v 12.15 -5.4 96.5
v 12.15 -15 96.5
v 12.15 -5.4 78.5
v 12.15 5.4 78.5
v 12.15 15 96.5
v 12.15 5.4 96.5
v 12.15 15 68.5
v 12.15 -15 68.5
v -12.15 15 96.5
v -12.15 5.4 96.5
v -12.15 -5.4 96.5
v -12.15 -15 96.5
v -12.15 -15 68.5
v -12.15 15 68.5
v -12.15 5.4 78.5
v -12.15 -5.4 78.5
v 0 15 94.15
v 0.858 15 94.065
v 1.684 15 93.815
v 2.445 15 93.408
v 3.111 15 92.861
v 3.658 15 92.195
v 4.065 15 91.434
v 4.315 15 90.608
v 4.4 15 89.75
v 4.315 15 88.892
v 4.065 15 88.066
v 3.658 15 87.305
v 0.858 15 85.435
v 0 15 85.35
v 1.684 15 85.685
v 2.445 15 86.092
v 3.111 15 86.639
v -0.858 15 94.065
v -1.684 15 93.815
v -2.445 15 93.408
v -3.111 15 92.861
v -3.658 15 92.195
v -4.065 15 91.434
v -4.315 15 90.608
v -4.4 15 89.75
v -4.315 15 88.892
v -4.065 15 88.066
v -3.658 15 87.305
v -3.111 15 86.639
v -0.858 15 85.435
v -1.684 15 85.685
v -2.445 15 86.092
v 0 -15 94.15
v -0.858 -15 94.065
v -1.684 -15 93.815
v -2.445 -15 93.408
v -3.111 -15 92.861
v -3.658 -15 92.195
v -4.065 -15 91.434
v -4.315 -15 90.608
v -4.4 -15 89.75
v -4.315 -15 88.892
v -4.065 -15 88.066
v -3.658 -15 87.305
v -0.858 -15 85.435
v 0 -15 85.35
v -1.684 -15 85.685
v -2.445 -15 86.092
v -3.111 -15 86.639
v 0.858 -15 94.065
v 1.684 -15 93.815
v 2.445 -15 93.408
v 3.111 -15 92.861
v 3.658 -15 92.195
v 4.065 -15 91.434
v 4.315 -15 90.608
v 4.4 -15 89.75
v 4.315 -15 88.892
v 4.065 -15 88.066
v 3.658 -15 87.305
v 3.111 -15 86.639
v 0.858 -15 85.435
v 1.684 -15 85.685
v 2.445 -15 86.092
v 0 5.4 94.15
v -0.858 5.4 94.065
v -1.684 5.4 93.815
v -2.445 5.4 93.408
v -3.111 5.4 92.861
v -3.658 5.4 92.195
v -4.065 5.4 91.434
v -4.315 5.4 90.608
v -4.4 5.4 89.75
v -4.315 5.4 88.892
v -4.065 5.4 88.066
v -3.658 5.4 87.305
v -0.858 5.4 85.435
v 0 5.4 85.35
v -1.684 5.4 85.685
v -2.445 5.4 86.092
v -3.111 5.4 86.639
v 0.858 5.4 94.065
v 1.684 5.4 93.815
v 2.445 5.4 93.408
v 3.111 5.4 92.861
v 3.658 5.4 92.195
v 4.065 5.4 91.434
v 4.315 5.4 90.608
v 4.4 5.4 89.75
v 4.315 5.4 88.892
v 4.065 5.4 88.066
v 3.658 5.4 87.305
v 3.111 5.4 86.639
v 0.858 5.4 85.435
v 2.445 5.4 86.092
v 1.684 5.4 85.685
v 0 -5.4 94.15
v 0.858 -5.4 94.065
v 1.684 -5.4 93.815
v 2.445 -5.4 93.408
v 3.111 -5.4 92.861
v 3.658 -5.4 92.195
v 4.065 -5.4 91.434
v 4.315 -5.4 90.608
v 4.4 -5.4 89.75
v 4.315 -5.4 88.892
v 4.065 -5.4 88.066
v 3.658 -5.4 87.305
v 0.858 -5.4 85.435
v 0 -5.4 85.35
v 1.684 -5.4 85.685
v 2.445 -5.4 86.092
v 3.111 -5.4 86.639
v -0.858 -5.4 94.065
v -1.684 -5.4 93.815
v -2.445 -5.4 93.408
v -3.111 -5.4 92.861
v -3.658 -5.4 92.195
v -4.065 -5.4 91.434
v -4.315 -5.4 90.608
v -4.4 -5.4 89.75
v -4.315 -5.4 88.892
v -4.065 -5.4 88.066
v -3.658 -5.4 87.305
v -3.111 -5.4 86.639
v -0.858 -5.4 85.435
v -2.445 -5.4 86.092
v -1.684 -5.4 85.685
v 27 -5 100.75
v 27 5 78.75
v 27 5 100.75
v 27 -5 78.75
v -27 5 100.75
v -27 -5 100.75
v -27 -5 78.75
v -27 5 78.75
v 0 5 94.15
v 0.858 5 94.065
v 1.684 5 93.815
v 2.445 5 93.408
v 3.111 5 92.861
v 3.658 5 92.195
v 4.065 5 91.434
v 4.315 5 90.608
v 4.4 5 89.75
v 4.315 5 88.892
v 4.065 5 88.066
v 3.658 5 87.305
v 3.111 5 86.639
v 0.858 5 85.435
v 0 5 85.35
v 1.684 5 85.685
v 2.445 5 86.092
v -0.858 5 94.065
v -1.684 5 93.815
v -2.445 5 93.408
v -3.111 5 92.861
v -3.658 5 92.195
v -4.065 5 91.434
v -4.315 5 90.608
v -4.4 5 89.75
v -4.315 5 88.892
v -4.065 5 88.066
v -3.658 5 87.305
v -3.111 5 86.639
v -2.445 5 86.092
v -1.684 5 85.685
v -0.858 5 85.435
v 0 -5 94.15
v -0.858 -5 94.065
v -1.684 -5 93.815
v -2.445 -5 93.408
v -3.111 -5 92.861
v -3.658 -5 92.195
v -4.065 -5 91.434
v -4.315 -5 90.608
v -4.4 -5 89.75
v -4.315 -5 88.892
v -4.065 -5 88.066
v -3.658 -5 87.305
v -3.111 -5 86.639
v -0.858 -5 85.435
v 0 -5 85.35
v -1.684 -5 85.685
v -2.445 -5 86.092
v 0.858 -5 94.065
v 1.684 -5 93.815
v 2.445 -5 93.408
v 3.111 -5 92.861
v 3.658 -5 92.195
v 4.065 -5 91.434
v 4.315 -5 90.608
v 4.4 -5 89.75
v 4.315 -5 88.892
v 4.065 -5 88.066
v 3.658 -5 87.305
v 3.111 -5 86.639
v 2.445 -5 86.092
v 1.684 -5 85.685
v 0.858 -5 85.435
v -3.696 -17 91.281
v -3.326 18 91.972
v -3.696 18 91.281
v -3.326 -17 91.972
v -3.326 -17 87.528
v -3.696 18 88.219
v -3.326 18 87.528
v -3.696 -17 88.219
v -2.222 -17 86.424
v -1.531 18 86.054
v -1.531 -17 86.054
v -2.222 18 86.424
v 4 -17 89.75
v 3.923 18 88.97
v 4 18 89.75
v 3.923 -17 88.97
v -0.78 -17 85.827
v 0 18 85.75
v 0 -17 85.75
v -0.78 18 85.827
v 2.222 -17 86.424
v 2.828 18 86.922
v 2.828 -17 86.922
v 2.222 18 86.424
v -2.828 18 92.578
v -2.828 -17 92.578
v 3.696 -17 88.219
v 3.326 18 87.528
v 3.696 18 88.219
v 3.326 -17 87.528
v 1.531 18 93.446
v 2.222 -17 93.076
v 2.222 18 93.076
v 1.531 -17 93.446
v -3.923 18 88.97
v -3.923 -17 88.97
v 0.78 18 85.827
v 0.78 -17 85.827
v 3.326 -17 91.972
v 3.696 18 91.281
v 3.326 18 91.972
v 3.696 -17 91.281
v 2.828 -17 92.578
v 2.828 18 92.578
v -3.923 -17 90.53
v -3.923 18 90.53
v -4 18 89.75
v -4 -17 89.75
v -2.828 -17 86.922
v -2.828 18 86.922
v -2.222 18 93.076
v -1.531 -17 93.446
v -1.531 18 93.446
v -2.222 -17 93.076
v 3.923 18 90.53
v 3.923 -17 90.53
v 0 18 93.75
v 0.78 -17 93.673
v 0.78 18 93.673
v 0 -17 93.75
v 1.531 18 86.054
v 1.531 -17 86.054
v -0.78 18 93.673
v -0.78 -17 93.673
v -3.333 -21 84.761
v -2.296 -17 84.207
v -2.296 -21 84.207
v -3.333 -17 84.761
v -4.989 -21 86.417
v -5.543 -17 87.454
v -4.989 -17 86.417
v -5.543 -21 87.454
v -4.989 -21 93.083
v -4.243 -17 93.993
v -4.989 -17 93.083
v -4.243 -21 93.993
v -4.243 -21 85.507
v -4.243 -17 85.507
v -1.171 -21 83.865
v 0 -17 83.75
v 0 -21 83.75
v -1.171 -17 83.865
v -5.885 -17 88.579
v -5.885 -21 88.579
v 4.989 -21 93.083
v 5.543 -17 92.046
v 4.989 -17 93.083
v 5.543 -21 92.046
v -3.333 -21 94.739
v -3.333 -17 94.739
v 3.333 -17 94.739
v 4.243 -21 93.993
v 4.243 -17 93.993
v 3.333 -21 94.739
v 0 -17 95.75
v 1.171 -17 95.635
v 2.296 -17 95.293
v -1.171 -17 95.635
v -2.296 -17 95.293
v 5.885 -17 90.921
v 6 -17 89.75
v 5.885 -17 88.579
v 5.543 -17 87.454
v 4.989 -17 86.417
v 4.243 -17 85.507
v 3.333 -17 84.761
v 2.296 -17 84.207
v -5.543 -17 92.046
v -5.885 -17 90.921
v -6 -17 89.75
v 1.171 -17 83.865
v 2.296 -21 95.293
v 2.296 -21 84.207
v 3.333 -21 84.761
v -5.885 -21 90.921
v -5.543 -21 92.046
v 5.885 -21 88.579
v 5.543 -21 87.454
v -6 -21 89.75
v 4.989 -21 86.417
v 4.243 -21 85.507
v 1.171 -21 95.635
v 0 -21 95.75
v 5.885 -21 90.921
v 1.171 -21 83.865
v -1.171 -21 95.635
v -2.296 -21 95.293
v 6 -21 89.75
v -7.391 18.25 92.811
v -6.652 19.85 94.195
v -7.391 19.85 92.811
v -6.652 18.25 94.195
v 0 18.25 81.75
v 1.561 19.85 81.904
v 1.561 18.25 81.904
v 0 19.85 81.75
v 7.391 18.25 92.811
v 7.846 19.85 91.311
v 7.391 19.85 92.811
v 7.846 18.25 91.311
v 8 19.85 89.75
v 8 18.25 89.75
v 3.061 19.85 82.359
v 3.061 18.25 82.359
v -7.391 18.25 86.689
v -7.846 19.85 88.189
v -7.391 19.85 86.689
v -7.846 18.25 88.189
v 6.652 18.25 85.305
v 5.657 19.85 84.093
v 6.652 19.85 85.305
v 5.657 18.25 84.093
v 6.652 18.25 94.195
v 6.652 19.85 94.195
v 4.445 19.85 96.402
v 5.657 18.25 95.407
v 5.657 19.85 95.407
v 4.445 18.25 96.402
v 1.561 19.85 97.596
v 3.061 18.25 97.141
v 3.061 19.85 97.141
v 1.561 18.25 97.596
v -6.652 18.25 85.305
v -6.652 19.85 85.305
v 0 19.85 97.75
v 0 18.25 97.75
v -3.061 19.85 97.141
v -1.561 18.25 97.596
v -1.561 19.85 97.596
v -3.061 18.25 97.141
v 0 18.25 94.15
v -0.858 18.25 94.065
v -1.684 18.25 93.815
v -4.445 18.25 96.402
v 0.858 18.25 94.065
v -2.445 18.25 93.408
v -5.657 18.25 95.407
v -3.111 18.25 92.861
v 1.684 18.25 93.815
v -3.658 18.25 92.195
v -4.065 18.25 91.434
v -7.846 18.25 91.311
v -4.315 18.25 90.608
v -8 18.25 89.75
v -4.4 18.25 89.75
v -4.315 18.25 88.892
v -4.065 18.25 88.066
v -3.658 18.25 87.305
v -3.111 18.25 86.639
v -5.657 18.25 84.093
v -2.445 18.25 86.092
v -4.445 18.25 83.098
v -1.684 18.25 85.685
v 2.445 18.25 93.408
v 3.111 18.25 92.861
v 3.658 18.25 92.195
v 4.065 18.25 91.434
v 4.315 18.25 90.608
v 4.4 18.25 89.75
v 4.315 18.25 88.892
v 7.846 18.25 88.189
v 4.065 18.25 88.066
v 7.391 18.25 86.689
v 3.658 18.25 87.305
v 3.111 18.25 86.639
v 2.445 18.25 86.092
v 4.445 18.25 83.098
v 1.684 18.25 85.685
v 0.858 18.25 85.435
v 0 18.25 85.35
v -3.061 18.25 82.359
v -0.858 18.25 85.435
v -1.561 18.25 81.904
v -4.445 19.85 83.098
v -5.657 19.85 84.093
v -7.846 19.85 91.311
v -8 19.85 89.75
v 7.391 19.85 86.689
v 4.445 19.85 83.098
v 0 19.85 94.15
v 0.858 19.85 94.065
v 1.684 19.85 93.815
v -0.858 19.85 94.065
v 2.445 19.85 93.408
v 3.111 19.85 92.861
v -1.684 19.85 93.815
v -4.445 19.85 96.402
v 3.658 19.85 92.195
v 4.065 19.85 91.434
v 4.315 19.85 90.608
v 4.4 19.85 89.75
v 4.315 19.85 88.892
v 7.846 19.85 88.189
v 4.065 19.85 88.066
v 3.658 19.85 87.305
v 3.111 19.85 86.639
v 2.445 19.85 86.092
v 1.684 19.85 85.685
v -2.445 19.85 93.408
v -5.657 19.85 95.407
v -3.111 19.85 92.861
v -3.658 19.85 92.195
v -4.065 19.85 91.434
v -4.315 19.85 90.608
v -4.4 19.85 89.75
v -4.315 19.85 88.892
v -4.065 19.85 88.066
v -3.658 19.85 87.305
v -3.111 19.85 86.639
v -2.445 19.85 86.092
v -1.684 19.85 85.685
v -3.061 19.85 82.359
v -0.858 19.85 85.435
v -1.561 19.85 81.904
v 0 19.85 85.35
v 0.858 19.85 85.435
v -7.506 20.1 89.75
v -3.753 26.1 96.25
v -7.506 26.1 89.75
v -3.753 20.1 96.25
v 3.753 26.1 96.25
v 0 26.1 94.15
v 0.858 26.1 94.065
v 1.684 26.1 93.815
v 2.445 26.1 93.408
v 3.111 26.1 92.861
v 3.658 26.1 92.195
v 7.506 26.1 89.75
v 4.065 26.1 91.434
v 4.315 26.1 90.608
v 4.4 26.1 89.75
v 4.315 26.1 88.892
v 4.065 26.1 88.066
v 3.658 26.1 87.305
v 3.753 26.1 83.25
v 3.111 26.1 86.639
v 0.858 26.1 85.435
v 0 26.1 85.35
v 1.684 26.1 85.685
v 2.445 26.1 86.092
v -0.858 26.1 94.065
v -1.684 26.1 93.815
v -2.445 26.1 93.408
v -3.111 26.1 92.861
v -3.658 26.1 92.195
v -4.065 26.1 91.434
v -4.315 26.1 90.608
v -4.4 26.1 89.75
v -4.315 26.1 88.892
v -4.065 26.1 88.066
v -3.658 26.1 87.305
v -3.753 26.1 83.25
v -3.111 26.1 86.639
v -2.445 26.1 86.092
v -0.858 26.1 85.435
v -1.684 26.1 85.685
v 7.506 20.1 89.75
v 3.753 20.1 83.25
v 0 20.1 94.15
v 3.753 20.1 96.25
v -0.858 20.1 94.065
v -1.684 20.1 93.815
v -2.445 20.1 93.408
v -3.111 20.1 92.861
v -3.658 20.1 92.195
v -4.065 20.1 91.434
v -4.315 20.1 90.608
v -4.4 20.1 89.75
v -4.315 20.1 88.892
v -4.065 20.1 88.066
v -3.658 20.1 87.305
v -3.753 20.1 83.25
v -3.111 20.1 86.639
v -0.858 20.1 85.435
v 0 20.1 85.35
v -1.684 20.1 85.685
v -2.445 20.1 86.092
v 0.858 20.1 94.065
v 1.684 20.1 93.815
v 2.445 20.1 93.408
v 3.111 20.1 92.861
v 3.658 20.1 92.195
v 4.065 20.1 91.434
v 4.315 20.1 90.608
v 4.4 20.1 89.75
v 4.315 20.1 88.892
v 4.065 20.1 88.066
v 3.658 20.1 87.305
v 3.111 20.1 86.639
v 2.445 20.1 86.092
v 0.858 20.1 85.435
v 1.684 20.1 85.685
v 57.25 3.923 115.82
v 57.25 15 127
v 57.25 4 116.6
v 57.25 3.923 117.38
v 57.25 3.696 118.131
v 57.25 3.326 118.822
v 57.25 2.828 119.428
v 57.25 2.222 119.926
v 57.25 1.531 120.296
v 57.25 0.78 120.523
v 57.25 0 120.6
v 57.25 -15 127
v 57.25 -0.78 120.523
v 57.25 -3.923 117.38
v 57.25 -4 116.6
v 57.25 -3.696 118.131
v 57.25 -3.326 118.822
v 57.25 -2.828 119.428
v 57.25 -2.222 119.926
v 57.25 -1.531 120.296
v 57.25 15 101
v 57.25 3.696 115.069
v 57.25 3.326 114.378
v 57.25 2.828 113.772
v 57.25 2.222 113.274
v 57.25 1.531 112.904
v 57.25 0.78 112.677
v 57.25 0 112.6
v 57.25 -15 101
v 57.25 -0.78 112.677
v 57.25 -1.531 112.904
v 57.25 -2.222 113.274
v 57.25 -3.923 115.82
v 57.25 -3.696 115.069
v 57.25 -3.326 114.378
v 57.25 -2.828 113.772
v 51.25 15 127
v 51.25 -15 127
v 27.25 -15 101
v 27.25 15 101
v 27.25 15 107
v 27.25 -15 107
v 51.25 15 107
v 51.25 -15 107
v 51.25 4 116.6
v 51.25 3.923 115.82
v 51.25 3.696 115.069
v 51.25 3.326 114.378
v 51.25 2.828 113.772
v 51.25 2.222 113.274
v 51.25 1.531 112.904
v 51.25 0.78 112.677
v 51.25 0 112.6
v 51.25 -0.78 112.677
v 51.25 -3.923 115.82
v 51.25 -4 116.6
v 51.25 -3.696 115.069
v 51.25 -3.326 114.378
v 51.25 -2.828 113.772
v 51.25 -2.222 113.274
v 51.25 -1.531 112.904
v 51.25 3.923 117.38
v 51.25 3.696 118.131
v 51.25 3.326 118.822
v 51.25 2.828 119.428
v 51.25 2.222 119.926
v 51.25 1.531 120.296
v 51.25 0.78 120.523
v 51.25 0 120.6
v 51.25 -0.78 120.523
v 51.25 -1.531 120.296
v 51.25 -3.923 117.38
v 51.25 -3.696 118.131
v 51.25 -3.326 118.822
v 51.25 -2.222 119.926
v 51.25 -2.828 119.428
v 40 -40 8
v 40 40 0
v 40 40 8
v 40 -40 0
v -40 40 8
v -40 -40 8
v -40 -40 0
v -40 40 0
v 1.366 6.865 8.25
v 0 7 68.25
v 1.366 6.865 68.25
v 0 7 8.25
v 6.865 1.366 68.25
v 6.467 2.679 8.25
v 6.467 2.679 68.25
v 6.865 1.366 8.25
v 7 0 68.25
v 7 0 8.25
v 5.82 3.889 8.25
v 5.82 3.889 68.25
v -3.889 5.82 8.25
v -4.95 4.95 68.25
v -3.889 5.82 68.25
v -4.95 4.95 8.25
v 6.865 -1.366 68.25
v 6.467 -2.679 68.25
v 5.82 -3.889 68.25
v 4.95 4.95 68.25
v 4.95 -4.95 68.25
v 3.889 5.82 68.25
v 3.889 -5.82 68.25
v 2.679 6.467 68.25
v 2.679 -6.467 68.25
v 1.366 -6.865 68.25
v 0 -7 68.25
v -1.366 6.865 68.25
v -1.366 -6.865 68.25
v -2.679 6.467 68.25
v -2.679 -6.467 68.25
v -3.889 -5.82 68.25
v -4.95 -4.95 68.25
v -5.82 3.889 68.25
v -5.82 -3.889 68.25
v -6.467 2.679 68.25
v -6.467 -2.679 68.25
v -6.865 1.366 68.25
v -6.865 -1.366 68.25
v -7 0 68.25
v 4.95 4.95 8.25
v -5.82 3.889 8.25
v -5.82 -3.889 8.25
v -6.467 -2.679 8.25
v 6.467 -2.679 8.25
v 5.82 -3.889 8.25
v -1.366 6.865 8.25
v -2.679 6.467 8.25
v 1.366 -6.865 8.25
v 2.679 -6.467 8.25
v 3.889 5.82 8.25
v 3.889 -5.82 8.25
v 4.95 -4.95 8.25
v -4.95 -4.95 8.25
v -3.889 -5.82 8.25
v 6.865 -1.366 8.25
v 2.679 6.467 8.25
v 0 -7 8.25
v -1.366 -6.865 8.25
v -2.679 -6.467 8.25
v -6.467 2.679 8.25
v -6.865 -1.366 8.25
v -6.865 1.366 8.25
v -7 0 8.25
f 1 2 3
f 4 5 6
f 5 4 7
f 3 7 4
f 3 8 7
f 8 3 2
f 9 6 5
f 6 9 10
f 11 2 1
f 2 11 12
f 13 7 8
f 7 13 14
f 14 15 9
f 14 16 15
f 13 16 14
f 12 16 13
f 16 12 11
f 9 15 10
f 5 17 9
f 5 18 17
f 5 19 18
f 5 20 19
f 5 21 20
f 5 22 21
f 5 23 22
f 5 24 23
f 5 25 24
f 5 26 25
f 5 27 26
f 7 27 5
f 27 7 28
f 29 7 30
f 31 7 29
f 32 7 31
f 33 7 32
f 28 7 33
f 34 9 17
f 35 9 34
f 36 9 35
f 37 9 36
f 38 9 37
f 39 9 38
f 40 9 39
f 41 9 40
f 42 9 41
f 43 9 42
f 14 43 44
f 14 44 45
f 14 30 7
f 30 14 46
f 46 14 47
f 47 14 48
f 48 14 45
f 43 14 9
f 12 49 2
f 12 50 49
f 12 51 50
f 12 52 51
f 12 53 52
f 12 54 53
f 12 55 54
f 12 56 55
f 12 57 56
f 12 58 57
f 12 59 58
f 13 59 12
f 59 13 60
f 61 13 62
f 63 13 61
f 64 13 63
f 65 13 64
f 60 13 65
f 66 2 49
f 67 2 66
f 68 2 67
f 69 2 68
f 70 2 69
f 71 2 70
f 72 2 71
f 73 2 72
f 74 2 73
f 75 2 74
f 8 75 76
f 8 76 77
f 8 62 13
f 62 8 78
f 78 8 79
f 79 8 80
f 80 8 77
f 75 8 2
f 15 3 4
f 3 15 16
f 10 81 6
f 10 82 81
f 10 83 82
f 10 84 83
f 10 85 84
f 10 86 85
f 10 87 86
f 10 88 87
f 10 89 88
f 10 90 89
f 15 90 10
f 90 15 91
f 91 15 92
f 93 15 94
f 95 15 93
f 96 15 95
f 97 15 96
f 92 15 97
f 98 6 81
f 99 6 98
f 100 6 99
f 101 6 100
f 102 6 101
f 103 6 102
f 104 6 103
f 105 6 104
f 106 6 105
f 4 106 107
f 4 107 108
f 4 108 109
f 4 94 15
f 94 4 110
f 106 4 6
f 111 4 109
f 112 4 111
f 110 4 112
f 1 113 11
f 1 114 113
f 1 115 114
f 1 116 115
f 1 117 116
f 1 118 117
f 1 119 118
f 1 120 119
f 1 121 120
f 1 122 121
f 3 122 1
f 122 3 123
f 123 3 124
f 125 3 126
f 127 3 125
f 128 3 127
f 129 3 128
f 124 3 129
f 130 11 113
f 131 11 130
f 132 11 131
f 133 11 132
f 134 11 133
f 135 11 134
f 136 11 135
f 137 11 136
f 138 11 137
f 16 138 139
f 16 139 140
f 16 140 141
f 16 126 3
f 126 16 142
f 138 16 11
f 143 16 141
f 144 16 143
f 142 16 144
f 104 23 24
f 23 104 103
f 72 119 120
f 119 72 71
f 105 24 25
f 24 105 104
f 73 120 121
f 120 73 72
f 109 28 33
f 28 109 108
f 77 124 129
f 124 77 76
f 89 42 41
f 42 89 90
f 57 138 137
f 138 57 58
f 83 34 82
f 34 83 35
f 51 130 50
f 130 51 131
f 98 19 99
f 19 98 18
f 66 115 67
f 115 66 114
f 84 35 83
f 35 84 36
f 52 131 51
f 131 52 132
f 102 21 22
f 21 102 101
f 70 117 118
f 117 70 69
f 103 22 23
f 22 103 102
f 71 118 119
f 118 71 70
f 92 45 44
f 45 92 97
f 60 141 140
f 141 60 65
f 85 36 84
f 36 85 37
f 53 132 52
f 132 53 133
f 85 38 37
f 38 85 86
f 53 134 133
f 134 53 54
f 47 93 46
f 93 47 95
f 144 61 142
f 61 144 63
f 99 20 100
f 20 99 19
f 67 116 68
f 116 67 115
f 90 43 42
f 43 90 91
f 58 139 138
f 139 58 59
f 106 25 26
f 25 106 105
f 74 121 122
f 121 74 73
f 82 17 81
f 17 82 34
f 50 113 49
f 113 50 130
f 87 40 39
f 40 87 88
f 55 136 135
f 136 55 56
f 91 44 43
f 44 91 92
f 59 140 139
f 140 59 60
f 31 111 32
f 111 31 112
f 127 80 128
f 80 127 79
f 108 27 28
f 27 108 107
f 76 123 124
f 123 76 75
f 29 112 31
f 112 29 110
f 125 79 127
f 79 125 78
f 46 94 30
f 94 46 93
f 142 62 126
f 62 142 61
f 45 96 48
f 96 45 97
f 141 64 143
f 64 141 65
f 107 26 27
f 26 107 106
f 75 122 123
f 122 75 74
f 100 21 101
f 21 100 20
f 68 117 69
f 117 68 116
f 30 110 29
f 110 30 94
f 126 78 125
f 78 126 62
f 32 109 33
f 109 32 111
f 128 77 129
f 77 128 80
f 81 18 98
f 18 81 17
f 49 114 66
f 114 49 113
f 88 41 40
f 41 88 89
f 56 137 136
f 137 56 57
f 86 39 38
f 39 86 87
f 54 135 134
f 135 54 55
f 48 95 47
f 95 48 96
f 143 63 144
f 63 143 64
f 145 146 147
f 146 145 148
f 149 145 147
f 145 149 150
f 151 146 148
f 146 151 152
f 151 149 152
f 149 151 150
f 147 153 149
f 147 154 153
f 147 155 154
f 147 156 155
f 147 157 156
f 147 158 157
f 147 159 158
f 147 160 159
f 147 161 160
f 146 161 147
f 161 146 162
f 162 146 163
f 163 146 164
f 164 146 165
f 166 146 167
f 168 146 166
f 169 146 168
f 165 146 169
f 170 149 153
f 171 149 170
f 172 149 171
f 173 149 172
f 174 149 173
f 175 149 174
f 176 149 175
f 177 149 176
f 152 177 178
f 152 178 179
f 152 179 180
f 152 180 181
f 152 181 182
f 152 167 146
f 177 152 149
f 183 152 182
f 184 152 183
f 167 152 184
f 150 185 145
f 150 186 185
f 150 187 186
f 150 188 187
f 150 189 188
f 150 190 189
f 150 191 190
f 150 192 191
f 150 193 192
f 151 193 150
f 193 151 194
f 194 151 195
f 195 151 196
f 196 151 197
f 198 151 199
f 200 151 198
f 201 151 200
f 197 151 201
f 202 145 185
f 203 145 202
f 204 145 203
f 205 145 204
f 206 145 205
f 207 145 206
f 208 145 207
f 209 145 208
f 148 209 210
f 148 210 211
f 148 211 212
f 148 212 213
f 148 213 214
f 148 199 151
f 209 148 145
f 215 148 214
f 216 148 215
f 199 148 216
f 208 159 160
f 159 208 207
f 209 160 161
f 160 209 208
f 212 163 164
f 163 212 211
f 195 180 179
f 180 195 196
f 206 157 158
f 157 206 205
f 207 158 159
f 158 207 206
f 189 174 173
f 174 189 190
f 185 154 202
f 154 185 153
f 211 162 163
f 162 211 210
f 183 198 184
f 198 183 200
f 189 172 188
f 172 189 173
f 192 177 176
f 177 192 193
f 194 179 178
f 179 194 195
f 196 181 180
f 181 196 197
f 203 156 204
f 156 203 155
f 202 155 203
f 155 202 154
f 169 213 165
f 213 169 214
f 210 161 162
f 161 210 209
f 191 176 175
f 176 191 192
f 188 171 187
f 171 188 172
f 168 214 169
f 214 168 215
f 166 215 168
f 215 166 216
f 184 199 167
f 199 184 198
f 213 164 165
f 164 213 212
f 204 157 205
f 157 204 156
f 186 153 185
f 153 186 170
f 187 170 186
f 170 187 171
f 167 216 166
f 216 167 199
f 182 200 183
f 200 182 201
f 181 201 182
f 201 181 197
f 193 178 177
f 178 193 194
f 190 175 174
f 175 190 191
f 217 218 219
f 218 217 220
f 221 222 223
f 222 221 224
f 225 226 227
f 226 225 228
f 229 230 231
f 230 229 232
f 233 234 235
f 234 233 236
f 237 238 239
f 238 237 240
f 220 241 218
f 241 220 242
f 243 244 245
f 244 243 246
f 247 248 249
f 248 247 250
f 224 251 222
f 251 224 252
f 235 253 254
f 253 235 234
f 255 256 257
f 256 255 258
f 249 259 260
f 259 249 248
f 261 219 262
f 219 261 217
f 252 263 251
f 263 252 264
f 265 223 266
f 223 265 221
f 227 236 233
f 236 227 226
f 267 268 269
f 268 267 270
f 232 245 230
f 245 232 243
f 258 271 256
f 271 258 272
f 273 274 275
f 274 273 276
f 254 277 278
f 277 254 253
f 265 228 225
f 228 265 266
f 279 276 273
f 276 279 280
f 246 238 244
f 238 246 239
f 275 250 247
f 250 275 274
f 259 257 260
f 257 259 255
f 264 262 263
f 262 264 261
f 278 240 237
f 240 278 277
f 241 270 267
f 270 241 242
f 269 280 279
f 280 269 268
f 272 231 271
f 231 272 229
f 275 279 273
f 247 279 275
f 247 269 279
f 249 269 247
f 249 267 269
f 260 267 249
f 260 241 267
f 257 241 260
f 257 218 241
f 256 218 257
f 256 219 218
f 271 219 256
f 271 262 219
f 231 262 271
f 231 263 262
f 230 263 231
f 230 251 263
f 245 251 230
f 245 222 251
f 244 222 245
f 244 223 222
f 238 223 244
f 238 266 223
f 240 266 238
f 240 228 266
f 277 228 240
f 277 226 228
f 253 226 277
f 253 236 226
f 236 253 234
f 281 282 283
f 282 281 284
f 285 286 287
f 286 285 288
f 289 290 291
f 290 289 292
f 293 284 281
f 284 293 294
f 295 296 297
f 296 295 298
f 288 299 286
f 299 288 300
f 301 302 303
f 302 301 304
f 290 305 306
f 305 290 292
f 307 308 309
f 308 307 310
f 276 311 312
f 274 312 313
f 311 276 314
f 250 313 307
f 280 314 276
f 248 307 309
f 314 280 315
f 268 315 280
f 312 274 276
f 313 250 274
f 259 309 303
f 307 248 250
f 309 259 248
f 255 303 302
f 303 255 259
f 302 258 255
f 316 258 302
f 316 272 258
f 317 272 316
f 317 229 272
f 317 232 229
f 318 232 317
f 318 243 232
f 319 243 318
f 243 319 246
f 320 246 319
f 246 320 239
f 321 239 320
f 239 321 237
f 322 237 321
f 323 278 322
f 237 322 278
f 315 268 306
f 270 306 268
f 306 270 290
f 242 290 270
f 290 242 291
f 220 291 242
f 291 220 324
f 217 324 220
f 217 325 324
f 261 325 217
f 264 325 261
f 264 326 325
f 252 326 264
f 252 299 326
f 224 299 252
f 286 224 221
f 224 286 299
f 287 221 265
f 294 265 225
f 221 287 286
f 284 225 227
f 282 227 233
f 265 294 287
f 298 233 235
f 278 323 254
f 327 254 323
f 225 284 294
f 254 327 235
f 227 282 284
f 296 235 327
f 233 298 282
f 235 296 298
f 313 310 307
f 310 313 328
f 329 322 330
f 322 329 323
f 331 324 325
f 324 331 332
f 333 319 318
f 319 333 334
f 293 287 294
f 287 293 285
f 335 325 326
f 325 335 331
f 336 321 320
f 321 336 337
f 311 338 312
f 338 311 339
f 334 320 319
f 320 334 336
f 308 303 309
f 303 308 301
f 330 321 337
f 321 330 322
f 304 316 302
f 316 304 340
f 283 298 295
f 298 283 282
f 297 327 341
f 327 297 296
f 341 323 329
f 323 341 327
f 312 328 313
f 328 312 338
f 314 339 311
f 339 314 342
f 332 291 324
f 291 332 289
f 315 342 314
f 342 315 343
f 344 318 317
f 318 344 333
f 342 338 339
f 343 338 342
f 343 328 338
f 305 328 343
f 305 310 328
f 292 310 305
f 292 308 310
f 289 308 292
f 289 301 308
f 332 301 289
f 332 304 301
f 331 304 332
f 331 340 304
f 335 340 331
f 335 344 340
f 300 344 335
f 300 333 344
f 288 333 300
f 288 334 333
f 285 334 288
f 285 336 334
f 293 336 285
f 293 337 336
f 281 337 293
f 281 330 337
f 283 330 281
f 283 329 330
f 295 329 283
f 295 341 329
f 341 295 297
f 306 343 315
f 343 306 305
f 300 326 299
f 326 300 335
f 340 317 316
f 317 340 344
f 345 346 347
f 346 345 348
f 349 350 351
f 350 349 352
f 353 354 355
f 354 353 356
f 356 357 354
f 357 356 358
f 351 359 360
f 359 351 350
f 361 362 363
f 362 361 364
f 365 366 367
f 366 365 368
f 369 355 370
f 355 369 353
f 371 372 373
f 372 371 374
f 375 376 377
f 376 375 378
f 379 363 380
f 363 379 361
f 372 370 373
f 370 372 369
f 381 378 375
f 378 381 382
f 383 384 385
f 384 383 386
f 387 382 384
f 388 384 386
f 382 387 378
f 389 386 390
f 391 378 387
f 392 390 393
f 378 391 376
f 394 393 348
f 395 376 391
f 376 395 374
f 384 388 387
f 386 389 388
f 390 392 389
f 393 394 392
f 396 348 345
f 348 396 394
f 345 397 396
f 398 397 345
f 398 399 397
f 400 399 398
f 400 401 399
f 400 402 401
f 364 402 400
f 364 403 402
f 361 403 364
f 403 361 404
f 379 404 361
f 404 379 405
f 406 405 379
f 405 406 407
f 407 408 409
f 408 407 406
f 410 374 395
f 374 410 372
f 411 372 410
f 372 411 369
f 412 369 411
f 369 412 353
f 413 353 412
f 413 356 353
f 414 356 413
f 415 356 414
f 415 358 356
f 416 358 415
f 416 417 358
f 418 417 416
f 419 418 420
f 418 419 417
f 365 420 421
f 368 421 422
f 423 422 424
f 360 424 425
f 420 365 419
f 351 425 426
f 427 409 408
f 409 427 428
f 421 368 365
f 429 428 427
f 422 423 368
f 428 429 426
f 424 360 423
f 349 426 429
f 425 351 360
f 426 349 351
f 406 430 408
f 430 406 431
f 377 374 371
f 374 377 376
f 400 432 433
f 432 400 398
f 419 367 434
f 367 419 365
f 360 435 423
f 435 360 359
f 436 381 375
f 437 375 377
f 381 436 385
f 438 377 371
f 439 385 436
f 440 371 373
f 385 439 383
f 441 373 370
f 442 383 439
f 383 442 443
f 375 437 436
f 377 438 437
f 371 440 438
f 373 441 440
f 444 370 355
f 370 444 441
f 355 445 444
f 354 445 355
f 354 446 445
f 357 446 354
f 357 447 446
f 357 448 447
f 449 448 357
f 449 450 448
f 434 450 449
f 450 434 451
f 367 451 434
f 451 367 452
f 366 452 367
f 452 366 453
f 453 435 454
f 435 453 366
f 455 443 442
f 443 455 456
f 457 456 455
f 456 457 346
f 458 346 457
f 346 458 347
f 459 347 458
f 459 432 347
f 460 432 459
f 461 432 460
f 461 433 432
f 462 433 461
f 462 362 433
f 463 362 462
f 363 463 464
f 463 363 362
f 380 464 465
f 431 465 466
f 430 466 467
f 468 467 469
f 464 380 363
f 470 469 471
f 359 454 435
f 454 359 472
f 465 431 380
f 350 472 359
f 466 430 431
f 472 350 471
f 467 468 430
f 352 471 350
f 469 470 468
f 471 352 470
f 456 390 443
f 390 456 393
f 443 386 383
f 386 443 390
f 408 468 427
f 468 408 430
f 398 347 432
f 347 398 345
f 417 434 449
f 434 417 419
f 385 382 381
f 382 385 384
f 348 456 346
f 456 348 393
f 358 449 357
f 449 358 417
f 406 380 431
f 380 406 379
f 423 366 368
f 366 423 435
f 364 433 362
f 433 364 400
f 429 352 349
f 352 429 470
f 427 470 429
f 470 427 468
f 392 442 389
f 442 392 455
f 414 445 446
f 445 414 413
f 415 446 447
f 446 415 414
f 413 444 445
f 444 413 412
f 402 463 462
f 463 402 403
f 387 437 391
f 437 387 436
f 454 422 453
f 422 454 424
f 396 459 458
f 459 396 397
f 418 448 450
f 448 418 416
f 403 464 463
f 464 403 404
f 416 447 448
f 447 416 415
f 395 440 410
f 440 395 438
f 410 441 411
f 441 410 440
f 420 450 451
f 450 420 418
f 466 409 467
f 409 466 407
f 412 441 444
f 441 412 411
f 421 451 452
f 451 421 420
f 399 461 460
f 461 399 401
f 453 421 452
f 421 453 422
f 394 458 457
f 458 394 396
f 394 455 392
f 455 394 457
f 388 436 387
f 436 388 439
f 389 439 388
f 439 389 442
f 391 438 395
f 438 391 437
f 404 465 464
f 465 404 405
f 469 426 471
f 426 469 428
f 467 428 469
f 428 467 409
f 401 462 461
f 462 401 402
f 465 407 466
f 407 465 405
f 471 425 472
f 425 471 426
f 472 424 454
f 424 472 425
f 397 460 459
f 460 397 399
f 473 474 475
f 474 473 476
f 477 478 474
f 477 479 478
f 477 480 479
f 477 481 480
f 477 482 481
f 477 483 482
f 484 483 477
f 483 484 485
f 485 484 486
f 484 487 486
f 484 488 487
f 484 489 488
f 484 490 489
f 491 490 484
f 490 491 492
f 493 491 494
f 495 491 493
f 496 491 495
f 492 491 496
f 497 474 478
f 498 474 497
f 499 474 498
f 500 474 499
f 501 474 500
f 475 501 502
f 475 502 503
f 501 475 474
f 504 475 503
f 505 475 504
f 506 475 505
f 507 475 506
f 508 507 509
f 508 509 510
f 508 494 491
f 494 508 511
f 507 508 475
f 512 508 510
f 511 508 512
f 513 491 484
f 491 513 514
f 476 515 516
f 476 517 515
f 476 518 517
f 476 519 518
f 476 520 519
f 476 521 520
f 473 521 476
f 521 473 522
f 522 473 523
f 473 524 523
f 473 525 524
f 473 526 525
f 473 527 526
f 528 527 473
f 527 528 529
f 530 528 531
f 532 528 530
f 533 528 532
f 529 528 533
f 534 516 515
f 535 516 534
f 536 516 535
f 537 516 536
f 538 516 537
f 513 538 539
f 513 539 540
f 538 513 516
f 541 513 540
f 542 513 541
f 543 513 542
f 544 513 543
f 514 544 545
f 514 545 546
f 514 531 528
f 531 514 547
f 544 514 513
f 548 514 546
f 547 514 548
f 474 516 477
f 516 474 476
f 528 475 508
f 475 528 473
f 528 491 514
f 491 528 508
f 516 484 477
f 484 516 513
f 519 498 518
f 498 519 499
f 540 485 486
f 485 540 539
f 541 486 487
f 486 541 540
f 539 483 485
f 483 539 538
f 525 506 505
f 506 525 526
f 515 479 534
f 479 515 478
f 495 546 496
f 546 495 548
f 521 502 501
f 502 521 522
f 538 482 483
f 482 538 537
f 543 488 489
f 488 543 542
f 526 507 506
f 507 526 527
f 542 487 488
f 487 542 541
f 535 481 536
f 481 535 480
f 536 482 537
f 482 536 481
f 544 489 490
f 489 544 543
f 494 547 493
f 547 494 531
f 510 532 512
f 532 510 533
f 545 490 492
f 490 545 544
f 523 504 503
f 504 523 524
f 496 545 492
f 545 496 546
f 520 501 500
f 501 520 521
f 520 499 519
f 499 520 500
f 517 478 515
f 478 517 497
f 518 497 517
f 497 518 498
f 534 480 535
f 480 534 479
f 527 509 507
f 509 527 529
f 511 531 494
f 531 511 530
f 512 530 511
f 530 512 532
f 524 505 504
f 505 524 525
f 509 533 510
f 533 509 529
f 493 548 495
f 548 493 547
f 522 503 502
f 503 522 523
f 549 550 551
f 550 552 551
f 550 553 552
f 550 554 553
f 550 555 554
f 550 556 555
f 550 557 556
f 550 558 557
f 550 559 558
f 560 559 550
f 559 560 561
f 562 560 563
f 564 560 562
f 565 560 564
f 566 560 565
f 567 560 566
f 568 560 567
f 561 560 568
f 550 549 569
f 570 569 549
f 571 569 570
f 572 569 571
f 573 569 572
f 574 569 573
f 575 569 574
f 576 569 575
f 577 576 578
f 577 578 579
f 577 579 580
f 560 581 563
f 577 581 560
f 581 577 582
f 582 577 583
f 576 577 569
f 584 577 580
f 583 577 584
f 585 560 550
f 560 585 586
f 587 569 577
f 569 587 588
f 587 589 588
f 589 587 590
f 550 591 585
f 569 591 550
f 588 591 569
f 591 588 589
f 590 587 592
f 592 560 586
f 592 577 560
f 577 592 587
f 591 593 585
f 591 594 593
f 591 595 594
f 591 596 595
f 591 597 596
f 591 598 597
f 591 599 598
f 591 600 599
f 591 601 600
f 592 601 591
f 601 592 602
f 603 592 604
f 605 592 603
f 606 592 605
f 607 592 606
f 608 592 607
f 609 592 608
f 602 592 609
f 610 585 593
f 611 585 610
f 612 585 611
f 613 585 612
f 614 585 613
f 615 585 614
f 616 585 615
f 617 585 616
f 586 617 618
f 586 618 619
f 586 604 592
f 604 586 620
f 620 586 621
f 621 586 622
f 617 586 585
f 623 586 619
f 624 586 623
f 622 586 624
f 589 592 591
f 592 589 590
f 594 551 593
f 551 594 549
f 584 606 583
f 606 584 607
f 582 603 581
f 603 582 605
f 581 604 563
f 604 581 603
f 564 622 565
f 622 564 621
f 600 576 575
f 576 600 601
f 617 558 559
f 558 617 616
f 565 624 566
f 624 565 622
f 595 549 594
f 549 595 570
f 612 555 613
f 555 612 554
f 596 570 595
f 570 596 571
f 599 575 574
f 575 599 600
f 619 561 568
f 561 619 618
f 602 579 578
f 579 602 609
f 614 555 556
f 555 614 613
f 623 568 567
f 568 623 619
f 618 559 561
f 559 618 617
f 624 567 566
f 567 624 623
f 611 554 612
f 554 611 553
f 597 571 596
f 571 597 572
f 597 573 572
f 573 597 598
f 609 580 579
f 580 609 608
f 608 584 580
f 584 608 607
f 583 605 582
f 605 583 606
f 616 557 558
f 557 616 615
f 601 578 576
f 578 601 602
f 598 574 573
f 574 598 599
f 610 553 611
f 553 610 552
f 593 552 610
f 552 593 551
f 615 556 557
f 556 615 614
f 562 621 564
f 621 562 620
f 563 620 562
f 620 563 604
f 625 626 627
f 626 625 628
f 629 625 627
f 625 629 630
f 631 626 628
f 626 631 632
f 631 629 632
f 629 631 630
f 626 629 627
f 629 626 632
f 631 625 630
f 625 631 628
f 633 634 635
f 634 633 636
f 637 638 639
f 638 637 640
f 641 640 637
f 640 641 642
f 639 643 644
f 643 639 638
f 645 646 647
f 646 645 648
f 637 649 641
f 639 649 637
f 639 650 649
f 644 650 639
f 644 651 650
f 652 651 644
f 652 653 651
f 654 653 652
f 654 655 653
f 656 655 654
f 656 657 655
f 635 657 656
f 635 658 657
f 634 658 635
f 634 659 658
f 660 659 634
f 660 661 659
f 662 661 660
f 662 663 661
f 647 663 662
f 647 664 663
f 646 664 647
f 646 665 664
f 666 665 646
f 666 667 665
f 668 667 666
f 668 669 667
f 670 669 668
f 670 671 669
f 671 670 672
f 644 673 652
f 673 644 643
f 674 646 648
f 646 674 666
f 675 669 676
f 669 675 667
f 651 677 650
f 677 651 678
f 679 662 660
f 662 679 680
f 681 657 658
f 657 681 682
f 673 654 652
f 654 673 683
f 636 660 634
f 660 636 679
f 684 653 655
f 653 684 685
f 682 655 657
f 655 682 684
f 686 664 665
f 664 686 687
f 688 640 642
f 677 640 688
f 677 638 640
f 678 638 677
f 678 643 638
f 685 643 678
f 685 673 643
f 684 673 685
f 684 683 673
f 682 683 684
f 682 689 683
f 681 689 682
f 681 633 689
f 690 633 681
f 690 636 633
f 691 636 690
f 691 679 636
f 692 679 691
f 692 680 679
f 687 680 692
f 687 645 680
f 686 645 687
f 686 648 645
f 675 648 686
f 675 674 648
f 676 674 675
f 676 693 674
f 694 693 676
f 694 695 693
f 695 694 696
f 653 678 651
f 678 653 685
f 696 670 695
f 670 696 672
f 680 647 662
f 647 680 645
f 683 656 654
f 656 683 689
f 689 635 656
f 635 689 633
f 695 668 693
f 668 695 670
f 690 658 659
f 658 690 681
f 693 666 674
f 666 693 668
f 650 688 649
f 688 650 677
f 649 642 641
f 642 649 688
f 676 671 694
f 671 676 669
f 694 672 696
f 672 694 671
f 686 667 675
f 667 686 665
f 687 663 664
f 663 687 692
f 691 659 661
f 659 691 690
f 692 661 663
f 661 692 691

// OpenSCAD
$fn = 32;

// ------------------------------------------------------------------------
// Lamp arm: column d14 x 60 mm, arm 54 mm
// Every part is its own module, assembly() places every instance.
// ------------------------------------------------------------------------

// --- part 1 ---
module lamp_base() {
  difference() {
    translate([-40, -40, 0]) cube([80, 80, 8]);
  }
}

// --- part 2 ---
module lamp_column() {
  cylinder(h = 60, d = 14);
}

// --- part 3 ---
module head_fork() {
  difference() {
    translate([-12.15, -15, 0]) cube([24.3, 30, 28]);
    translate([-13.15, -5.4, 10]) cube([26.3, 10.8, 19]);
    translate([0, 0, 21.25]) rotate([90, 0, 0]) cylinder(h = 32, d = 8.8, center = true);
  }
}

// --- part 4 ---
module lamp_arm() {
  difference() {
    translate([-27, -5, 0]) cube([54, 10, 22]);
    translate([0, 0, 11]) rotate([90, 0, 0]) cylinder(h = 12, d = 8.8, center = true);
  }
}

// --- part 5 ---
module arm_pin() {
  rotate([0, 90, 0]) cylinder(h = 36, d = 8, center = true);
  translate([-21, 0, 0]) rotate([0, 90, 0]) cylinder(h = 4, d = 12);
}

// --- part 6 ---
module arm_washer() {
  difference() {
      translate([0, 0, 0]) cylinder(h = 1.6, d = 16);
      translate([0, 0, -1]) cylinder(h = 3.6, d = 8.8);
    }
}

// --- part 7 ---
module arm_nut() {
  difference() {
    linear_extrude(height = 6) polygon(points = [[7.506, 0], [3.753, 6.5], [-3.753, 6.5], [-7.506, 0], [-3.753, -6.5], [3.753, -6.5]]);
    translate([0, 0, -1]) cylinder(h = 8, d = 8.8);
  }
}

// --- part 8 ---
module shade_bracket() {
  difference() {
    translate([-15, -15, 0]) cube([30, 30, 26]);
    translate([-16, -16, 6]) cube([25, 32, 21]);
    translate([12, 0, 15.6]) rotate([0, 90, 0]) cylinder(h = 8, d = 8, center = true);
  }
}

// --- assembly ---
module assembly() {
  color([0.80, 0.24, 0.20]) translate([0, 0, 0]) rotate([0, 0, 0]) lamp_base();
  color([0.20, 0.45, 0.75]) translate([0, 0, 8.25]) rotate([0, 0, 0]) lamp_column();
  color([0.25, 0.62, 0.32]) translate([0, 0, 68.5]) rotate([0, 0, 0]) head_fork();
  color([0.92, 0.70, 0.18]) translate([0, 0, 78.75]) rotate([0, 0, 0]) lamp_arm();
  color([0.58, 0.35, 0.70]) translate([0, 0, 89.75]) rotate([0, 0, 90]) arm_pin();
  color([0.16, 0.66, 0.66]) translate([0, 19.85, 89.75]) rotate([90, 0, 0]) arm_washer();
  color([0.85, 0.48, 0.18]) translate([0, 26.1, 89.75]) rotate([90, 0, 0]) arm_nut();
  color([0.55, 0.60, 0.65]) translate([42.25, 0, 101]) rotate([0, 0, 0]) shade_bracket();
}

assembly();
